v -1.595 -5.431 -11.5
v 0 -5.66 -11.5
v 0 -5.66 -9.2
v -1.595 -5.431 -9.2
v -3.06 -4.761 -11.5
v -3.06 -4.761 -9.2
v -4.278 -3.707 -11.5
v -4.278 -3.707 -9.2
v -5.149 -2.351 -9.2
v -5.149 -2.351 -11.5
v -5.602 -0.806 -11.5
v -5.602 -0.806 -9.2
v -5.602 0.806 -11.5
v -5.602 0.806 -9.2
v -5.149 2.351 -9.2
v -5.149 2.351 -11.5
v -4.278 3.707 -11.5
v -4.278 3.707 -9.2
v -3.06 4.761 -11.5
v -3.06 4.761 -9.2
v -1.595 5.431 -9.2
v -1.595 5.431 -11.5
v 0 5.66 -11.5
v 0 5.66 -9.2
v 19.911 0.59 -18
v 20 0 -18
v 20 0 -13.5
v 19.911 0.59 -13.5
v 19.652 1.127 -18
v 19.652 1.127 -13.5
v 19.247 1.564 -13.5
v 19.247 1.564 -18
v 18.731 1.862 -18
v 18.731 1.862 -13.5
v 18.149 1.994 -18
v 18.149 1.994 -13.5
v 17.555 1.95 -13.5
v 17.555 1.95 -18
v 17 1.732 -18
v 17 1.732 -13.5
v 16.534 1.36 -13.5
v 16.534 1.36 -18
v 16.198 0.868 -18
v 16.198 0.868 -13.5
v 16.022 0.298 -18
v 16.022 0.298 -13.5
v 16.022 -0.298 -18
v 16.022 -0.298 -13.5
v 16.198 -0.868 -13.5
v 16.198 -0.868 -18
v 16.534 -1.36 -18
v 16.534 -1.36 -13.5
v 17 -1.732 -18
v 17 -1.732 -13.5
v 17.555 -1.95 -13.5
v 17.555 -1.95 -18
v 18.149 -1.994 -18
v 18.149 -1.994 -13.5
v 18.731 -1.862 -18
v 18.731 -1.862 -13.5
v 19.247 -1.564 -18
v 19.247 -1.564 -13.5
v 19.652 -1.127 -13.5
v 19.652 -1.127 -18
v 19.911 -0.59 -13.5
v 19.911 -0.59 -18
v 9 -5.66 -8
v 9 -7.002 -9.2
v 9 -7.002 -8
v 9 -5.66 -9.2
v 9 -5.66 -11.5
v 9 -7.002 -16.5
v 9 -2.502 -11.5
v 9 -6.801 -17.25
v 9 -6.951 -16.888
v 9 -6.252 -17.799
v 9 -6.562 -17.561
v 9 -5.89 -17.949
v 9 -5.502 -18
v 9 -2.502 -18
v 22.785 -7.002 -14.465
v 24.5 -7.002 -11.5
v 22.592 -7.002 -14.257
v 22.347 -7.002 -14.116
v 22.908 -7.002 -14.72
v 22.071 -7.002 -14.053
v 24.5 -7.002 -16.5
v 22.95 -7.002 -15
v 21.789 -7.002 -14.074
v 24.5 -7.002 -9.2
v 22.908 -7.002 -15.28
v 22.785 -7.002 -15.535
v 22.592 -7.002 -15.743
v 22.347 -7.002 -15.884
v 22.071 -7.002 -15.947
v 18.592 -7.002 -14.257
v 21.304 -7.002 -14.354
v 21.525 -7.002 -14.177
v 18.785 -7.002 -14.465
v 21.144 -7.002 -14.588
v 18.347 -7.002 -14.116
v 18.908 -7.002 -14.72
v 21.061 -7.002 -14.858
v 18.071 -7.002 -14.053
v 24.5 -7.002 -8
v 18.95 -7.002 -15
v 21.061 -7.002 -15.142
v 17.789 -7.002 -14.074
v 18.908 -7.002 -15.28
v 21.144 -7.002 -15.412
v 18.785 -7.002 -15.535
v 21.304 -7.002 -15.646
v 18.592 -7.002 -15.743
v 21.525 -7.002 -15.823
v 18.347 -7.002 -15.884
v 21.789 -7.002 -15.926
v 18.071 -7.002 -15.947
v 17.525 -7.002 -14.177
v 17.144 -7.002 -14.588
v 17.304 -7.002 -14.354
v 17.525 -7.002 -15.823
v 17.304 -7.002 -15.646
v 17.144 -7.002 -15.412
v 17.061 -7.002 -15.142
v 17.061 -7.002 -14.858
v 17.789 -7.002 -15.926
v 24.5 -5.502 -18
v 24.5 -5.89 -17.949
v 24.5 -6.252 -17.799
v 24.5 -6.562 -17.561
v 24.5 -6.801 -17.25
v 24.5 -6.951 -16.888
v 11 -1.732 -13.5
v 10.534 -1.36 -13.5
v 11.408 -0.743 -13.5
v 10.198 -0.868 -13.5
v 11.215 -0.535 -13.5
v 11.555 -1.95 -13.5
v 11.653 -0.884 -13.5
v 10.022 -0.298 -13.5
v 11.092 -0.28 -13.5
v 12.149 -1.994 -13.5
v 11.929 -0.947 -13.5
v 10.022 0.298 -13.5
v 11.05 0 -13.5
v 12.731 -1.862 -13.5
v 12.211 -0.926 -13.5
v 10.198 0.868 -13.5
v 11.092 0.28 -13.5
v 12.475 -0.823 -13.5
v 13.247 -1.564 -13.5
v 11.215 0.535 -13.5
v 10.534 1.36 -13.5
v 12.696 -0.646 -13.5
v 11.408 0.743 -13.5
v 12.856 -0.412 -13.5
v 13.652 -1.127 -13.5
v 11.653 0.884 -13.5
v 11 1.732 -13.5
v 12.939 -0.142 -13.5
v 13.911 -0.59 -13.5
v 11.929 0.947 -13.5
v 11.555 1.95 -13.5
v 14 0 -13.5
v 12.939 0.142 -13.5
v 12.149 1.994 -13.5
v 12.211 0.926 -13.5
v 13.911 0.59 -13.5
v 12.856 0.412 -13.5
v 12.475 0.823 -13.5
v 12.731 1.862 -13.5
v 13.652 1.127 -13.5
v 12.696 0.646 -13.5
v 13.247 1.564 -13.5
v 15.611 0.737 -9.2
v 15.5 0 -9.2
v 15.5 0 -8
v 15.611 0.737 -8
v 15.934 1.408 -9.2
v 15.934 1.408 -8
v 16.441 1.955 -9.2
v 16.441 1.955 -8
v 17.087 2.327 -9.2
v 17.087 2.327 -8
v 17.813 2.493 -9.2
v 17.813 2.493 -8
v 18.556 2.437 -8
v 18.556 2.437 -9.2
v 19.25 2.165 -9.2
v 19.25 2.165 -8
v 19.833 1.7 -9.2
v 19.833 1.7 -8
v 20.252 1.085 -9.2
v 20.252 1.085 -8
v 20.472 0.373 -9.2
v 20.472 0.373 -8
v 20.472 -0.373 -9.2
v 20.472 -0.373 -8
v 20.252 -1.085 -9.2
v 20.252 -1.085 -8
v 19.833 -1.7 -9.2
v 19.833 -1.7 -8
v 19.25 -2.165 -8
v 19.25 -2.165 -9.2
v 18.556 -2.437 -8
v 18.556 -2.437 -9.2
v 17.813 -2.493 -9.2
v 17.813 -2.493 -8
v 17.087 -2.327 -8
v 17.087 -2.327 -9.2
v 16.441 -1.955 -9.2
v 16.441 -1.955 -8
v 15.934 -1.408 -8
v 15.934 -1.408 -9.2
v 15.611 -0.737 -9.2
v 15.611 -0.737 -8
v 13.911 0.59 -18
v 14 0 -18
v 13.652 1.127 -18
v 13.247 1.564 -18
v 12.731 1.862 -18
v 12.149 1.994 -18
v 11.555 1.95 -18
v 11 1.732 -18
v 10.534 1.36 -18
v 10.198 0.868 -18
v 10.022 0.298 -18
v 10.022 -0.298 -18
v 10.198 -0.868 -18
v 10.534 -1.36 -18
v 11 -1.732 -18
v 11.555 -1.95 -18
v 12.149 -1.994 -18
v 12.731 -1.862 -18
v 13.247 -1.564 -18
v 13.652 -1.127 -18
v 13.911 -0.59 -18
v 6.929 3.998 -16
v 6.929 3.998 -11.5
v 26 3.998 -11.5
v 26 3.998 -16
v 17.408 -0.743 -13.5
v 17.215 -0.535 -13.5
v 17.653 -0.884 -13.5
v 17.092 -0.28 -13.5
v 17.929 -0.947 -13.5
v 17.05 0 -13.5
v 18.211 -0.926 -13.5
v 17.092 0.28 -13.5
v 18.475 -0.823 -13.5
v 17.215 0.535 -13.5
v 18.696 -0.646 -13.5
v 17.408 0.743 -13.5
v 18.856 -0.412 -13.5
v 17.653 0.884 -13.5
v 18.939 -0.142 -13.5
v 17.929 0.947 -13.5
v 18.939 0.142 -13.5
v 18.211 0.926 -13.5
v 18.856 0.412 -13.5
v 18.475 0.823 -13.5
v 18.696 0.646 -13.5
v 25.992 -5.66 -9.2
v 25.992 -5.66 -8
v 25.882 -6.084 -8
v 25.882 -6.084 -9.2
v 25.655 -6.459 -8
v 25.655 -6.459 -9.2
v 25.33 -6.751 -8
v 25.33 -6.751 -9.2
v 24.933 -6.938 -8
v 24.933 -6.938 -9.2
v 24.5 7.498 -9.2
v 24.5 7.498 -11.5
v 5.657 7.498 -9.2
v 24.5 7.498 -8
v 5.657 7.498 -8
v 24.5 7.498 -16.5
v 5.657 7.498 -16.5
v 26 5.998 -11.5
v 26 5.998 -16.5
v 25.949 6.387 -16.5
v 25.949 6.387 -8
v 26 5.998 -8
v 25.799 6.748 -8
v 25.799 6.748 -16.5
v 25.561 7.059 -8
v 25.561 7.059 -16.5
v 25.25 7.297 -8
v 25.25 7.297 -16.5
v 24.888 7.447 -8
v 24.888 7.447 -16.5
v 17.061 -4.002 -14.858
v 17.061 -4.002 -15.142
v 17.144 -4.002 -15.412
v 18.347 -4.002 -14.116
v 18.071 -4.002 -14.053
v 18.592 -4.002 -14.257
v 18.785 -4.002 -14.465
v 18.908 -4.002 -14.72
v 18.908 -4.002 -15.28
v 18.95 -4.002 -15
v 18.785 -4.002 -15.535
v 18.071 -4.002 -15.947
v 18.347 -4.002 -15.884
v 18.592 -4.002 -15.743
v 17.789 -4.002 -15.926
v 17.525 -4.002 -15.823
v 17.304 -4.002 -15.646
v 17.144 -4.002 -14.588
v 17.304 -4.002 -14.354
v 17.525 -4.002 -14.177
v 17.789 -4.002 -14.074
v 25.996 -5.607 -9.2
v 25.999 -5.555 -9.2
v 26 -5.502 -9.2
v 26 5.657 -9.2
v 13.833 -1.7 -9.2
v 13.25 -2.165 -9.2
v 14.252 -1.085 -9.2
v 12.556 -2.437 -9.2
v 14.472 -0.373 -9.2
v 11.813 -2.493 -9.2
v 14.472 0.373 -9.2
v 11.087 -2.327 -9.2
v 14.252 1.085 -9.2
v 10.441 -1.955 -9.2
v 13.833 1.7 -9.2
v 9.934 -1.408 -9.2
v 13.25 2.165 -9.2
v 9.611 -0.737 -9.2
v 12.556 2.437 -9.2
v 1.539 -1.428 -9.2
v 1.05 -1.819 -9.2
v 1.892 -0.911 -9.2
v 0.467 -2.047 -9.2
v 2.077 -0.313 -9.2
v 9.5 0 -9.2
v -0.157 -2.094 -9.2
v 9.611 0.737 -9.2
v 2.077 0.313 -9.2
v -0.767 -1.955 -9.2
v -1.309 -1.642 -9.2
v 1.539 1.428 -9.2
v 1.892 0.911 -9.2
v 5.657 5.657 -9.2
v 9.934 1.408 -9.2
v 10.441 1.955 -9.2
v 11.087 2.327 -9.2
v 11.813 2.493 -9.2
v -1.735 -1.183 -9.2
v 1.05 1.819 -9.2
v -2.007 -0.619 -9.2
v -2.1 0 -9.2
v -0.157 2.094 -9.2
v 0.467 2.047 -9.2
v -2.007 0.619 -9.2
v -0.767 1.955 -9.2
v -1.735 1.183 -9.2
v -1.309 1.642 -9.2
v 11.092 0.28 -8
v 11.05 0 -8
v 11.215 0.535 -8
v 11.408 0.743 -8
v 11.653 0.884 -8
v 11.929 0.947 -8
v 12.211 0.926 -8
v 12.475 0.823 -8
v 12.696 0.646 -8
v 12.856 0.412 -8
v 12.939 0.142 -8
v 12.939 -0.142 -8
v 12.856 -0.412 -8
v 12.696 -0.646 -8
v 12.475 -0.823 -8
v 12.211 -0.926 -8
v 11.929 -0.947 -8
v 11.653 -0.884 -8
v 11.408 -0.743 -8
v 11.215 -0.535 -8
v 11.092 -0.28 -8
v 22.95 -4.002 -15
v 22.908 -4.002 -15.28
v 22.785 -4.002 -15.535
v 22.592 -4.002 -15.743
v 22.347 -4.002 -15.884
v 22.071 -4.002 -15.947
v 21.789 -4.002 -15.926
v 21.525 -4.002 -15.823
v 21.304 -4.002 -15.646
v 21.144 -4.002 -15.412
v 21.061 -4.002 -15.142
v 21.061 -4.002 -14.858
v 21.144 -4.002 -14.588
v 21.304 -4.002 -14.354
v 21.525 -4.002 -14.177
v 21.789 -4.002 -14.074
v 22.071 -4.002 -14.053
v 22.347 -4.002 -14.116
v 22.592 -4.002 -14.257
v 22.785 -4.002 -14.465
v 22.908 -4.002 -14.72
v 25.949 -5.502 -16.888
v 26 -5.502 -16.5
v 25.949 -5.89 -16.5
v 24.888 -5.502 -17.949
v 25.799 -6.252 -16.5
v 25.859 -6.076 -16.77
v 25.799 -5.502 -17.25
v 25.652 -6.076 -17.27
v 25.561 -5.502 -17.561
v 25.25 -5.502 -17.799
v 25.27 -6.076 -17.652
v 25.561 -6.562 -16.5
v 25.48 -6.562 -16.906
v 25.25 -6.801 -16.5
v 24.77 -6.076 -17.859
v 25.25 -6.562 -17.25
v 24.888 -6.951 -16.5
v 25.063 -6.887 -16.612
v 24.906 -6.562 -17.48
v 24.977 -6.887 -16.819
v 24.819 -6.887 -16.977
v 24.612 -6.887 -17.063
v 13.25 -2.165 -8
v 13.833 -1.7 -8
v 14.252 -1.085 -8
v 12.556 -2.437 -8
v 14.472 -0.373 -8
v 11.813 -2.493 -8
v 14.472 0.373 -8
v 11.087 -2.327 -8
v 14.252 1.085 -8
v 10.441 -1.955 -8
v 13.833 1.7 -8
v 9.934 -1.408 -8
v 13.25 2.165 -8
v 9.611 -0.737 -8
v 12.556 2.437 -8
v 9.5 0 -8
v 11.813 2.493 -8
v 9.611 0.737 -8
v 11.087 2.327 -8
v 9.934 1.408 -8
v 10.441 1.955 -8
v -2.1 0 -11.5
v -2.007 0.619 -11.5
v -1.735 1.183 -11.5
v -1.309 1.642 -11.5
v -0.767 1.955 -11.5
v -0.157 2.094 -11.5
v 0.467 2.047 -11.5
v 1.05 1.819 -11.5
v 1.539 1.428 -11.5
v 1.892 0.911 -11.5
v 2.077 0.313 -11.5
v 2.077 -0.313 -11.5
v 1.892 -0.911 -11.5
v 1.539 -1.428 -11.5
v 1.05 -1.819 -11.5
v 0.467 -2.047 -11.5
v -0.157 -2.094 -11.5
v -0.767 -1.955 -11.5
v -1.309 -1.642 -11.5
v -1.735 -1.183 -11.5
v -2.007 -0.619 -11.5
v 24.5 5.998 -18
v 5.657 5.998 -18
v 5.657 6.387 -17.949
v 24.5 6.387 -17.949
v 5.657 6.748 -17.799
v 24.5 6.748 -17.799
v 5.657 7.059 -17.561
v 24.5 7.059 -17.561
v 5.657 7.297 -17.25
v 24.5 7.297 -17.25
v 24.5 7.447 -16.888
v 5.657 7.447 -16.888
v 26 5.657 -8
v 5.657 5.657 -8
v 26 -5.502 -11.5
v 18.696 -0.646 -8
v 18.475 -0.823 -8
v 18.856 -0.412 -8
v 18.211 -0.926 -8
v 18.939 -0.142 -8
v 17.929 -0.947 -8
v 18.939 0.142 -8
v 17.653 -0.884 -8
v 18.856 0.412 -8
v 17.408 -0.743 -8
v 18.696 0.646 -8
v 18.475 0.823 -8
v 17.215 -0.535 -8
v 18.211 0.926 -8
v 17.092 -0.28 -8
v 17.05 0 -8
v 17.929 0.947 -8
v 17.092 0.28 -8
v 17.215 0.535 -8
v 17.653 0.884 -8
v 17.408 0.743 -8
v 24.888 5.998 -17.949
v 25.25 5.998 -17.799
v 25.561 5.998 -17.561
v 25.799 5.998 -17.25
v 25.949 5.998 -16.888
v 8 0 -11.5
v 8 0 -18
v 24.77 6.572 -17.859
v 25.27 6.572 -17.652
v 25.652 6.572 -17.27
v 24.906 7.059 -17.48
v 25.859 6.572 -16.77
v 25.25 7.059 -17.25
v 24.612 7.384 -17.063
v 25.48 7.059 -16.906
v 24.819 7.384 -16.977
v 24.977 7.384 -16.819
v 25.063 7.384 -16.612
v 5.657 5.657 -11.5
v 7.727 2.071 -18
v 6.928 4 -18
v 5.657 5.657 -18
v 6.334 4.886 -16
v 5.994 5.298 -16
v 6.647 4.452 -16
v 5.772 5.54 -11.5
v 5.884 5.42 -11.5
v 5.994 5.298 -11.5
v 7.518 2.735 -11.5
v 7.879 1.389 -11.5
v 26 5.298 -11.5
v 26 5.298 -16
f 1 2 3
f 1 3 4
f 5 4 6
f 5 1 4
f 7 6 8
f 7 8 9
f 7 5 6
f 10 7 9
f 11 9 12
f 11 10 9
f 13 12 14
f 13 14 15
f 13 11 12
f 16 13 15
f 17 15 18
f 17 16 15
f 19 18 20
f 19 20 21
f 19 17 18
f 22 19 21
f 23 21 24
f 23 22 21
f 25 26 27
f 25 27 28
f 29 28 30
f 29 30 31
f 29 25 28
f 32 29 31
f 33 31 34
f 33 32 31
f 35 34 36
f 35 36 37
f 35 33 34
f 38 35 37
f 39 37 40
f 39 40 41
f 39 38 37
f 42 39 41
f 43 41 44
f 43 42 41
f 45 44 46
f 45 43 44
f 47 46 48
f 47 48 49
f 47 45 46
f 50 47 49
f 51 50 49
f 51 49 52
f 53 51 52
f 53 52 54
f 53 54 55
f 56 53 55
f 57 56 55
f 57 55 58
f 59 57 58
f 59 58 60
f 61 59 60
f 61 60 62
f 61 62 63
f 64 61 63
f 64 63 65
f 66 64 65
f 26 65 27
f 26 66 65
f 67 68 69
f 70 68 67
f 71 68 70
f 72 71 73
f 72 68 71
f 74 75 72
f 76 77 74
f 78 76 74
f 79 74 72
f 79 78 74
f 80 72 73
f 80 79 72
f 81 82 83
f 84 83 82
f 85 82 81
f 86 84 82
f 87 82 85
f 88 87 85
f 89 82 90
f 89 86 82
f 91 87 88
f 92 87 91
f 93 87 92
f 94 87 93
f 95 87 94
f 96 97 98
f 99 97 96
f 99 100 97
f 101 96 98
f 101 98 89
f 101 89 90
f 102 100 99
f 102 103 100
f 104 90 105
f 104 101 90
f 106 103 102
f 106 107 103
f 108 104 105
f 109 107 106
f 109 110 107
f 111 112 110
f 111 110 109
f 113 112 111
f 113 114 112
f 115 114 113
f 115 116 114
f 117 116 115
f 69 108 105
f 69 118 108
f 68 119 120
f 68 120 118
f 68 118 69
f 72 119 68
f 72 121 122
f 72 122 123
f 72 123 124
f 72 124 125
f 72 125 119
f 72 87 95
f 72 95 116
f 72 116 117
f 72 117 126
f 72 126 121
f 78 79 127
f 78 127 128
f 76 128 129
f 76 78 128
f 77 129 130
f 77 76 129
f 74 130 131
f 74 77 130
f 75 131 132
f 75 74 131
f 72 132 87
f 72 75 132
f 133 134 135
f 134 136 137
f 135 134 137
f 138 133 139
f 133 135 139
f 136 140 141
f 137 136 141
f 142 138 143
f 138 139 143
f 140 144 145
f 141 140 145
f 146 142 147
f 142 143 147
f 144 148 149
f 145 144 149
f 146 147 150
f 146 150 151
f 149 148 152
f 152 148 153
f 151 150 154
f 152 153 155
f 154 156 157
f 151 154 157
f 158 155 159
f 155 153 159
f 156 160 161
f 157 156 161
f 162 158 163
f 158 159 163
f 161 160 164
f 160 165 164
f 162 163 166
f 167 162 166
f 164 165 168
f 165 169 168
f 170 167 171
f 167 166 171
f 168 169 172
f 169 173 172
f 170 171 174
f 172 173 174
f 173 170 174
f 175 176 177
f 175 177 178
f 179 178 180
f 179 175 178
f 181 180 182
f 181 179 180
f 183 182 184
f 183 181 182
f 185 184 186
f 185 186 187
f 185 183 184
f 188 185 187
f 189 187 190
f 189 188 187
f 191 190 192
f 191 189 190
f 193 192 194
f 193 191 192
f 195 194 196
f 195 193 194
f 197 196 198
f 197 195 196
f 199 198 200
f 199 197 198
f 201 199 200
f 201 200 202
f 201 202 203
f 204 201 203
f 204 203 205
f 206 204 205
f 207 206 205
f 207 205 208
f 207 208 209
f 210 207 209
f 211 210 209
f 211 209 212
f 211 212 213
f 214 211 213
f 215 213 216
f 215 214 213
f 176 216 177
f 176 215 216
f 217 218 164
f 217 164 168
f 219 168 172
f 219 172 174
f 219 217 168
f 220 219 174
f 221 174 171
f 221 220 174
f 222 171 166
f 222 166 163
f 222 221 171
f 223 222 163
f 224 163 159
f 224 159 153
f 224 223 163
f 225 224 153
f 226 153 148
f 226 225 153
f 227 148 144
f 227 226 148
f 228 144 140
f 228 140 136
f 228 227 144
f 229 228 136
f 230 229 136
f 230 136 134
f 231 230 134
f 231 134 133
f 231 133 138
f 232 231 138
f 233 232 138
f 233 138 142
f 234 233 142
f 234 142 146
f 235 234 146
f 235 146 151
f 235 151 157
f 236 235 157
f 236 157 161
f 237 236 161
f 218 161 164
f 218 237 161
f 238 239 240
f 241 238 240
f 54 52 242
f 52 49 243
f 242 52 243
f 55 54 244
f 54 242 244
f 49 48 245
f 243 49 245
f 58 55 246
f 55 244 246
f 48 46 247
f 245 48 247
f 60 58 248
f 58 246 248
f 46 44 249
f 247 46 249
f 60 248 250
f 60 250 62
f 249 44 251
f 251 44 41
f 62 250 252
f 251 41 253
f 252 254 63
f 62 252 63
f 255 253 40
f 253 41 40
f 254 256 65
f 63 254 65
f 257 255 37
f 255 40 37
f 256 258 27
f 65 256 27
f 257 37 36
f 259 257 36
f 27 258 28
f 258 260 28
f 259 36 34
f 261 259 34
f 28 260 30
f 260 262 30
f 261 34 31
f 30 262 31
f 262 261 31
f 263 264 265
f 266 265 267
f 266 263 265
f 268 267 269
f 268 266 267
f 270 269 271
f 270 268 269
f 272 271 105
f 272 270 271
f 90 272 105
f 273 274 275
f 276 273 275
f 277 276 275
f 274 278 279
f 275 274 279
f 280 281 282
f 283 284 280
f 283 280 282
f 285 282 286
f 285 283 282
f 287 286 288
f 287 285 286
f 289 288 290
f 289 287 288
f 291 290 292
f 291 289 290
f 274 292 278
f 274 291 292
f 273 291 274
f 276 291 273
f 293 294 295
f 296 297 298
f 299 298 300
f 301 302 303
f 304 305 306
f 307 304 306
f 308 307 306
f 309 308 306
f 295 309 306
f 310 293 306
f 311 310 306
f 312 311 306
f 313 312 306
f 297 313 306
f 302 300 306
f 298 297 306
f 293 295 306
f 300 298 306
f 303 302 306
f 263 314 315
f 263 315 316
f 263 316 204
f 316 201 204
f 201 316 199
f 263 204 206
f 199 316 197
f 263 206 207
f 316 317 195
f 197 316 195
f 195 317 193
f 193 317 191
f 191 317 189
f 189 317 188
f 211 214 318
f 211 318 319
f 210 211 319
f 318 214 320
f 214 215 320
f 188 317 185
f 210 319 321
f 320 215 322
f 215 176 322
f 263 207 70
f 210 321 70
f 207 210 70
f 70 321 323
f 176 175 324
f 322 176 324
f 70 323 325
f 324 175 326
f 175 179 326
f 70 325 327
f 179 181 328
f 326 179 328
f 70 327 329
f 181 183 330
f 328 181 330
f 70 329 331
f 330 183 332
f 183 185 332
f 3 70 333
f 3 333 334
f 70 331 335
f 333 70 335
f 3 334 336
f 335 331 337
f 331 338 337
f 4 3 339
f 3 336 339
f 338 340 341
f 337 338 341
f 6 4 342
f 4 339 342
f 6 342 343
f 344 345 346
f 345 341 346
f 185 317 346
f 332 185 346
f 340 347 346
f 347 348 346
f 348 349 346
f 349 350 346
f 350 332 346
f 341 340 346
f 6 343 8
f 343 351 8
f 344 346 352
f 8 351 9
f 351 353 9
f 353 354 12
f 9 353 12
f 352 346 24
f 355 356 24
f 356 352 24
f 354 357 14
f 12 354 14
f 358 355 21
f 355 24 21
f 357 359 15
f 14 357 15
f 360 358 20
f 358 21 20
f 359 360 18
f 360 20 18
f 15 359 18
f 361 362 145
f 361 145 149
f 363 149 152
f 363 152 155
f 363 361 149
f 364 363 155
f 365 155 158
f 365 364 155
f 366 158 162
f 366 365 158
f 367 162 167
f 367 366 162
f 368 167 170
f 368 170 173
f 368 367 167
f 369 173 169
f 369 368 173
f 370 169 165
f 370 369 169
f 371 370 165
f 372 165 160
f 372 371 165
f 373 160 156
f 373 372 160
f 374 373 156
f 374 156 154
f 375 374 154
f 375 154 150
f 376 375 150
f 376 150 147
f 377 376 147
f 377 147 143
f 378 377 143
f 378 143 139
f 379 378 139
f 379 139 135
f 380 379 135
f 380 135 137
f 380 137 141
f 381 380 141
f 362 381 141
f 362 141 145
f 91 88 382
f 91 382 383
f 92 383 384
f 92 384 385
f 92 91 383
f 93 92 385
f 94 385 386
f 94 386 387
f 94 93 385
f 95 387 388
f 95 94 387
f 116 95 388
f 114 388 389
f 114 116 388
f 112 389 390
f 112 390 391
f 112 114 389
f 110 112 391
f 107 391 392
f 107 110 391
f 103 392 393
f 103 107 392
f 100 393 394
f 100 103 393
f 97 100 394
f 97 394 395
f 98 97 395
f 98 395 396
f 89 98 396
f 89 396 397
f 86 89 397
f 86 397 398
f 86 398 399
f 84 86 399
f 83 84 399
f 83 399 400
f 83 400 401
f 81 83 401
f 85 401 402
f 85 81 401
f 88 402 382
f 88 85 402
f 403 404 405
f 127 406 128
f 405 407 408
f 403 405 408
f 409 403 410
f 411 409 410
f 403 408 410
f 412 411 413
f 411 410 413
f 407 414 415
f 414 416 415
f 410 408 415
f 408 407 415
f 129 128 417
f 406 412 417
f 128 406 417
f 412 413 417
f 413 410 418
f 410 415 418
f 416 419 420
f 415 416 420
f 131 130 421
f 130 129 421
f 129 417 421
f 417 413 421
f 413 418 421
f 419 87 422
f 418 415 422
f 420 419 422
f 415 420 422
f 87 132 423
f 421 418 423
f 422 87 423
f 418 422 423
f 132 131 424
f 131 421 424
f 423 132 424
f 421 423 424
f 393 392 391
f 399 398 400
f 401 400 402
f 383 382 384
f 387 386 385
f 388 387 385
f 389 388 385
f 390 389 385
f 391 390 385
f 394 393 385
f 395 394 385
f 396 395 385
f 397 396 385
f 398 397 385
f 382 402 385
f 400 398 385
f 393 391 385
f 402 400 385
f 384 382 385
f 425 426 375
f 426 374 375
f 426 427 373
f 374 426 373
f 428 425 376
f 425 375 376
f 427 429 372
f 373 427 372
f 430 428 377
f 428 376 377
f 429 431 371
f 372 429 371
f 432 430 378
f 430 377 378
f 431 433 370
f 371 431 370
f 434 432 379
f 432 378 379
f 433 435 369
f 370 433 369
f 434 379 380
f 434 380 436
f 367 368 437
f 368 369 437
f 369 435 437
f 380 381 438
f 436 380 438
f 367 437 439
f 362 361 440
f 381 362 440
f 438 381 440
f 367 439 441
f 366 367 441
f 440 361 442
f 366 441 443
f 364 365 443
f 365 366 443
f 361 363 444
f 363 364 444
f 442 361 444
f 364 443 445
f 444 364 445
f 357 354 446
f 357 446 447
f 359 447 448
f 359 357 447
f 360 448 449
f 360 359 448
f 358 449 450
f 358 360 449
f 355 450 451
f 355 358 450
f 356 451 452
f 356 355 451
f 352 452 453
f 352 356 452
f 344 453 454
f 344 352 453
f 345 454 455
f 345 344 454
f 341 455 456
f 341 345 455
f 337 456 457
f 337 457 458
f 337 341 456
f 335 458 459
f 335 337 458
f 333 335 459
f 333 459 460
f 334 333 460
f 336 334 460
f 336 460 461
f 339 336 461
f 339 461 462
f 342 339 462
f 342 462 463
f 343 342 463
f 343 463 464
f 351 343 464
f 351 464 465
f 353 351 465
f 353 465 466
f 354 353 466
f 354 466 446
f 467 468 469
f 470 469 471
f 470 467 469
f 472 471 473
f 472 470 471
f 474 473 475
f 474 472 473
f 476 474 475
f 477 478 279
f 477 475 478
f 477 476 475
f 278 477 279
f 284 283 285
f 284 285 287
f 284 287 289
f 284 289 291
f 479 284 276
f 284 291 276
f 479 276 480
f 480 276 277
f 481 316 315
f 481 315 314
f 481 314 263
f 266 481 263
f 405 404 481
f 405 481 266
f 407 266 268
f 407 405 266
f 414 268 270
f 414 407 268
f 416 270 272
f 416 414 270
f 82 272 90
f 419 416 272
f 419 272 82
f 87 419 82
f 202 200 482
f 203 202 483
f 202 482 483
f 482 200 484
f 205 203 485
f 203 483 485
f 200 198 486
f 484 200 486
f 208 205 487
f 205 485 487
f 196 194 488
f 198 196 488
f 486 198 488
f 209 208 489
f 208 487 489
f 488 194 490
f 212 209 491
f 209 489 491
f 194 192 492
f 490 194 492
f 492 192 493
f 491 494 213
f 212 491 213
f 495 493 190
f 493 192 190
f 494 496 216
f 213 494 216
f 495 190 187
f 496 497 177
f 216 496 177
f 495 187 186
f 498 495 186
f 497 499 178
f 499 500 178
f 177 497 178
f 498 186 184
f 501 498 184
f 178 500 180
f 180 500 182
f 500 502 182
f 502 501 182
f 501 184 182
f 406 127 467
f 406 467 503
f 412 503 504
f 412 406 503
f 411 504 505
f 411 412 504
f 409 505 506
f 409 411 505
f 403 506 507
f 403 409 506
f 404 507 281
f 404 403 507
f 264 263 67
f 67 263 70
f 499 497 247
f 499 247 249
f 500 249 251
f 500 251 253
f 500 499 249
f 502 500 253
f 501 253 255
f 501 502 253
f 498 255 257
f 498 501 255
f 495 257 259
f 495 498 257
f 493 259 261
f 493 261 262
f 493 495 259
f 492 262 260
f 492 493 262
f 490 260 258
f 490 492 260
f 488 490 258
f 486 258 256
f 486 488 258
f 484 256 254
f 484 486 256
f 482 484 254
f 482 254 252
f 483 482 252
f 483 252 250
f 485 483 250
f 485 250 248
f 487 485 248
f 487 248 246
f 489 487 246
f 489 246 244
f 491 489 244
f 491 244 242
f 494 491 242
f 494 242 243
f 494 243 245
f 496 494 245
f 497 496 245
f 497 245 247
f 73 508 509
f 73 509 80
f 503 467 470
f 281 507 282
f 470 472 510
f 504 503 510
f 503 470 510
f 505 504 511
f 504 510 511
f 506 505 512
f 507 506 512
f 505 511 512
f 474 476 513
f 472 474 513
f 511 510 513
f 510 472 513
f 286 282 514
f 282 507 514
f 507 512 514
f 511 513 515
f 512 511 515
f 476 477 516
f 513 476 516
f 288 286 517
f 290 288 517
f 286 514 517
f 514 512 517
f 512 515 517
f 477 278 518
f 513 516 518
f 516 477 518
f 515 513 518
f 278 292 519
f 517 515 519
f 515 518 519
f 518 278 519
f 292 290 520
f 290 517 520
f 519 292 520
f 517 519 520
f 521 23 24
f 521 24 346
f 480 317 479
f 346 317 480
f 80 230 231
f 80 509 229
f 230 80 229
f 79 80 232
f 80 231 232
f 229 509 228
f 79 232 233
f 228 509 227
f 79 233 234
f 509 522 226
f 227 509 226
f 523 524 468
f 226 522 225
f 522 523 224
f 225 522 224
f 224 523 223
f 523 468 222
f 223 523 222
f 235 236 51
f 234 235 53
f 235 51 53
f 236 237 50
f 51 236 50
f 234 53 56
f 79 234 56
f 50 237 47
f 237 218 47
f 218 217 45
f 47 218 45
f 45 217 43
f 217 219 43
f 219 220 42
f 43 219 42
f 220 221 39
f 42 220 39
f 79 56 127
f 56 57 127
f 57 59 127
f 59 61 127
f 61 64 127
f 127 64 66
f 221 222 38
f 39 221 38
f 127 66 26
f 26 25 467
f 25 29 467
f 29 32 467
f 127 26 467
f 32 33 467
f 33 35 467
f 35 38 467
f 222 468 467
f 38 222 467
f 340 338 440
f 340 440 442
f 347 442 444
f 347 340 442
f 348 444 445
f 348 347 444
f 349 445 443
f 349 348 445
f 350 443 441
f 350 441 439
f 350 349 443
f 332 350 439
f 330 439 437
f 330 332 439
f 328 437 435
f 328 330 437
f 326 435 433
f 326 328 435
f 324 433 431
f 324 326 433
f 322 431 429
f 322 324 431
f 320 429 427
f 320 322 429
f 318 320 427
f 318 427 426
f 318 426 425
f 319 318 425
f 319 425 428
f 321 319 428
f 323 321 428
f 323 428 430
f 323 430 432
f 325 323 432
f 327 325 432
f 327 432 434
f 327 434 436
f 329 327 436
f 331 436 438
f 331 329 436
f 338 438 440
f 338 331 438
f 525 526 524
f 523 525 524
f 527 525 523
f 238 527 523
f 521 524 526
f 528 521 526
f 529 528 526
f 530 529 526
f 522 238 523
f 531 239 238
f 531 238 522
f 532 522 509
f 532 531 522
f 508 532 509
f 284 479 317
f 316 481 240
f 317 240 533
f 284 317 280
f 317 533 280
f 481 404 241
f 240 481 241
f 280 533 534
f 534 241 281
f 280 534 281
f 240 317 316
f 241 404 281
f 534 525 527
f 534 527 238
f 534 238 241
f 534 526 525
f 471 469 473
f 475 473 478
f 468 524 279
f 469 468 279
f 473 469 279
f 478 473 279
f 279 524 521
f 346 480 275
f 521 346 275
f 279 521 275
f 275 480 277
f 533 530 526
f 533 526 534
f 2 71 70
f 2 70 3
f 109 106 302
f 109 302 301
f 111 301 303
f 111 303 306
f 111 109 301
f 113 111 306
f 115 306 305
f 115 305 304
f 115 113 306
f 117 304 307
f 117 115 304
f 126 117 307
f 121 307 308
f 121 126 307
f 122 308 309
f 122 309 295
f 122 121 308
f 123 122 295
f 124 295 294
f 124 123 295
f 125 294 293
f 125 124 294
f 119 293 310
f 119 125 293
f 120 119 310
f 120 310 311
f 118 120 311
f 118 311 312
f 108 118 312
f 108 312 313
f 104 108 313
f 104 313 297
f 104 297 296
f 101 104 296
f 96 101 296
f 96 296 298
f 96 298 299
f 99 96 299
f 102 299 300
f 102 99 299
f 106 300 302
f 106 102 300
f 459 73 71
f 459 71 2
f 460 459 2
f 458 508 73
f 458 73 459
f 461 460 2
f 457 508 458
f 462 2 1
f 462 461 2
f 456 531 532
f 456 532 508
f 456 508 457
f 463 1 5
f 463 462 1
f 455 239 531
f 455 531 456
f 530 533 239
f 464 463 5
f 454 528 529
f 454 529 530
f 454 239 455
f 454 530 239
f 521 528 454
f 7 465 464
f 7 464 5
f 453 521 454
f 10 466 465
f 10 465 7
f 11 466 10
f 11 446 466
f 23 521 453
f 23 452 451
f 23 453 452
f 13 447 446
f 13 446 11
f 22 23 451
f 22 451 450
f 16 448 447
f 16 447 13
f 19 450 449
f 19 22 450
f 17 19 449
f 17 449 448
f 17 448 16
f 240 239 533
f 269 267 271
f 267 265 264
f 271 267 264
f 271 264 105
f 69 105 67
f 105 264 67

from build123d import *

# Parameters (mm, degrees)
BOSS_EXTRUDE1_DEPTH = 2
BOSS_EXTRUDE2_START = 4.5
BOSS_EXTRUDE2_DEPTH = 4.5
CUT_EXTRUDE1_DEPTH  = 4.5
BOSS_EXTRUDE3_DEPTH = 2.3
SKETCH9_R           = 2.1
CUT_EXTRUDE2_DEPTH  = 2.5
SKETCH10_R          = 2.5
BOSS_EXTRUDE4_DEPTH = 1.2
SKETCH11_R          = 0.95
CUT_EXTRUDE3_DEPTH  = 9.2
SKETCH12_R          = 2
CUT_EXTRUDE4_DEPTH  = 4.5
SKETCH14_W          = 20.343145751
SKETCH14_H          = 1.841510486
SKETCH14_W_2        = 17
SKETCH14_H_2        = 1.341637015
BOSS_EXTRUDE5_DEPTH = 1.2
FILLET1_R           = 1.5
SKETCH17_R          = 0.95
CUT_EXTRUDE5_DEPTH  = 3


# Read off the part's stored shape, not the designer's step: Boss-Extrude3
with BuildPart() as part:
    # Sketch5 → Boss-Extrude1 (new body)
    with BuildSketch(Plane.XY):
        with BuildLine():
            Line((8, 0), (9, -2.501635265))
            Line((9, -2.501635265), (9, -7.001635265))
            Line((9, -7.001635265), (26, -7.001635265))
            Line((26, -7.001635265), (26, 7.498364735))
            Line((26, 7.498364735), (5.656854249, 7.498364735))
            Line((5.656854249, 7.498364735), (5.656854249, 5.656854249))
            ThreePointArc((5.656854249, 5.656854249), (7.39103626, 3.061467459), (8, 0))
        make_face()
    extrude(amount=BOSS_EXTRUDE1_DEPTH)

    # Sketch6 → Boss-Extrude2 (add)
    with BuildSketch(Plane(origin=(0, 0, 0), x_dir=(-1, 0, 0), z_dir=(0, 0, -1)).offset(BOSS_EXTRUDE2_START)):
        with BuildLine():
            Line((-5.656854249, 7.498364735), (-5.656854249, 5.656854249))
            ThreePointArc((-5.656854249, 5.656854249), (-7.39103626, 3.061467459), (-8, 0))
            Line((-8, 0), (-9, -2.501635265))
            Line((-9, -2.501635265), (-9, -7.001635265))
            Line((-9, -7.001635265), (-26, -7.001635265))
            Line((-26, -7.001635265), (-26, 7.498364735))
            Line((-26, 7.498364735), (-5.656854249, 7.498364735))
        make_face()
    extrude(amount=-BOSS_EXTRUDE2_DEPTH)

    # Sketch7 → Cut-Extrude1 (cut)
    with BuildSketch(Plane(origin=(0, 0, -4.5), x_dir=(-1, 0, 0), z_dir=(0, 0, -1))):
        Polygon((-26, 5.298364735), (-2.738141148, 5.298364735), (-2.738141148, 3.998364735), (-29.849535112, 3.998364735), (-29.849535112, 5.298364735), align=None)
    extrude(amount=-CUT_EXTRUDE1_DEPTH, mode=Mode.SUBTRACT)

    # Boss-Extrude3 outline → Boss-Extrude3 (add)
    with BuildSketch(Plane(origin=(0, 0, -4.5), x_dir=(-1, 0, 0), z_dir=(0, 0, -1))):
        with BuildLine():
            Line((-9, -7.001635265), (-9, -5.65999825))
            Line((-9, -5.65999825), (0, -5.659997813))
            ThreePointArc((0, -5.659997813), (5.659997813, 0), (0, 5.659997813))
            Line((0, 5.659997813), (-5.656854249, 5.656854249))
            Line((-5.656854249, 5.656854249), (-5.656854249, 7.498364735))
            Line((-5.656854249, 7.498364735), (-26, 7.498364735))
            Line((-26, 7.498364735), (-26, -7.001635265))
            Line((-26, -7.001635265), (-9, -7.001635265))
        make_face()
    extrude(amount=BOSS_EXTRUDE3_DEPTH)

    # Sketch9 → Cut-Extrude2 (cut)
    with BuildSketch(Plane(origin=(0, 0, -6.8), x_dir=(-1, 0, 0), z_dir=(0, 0, -1))):
        Circle(SKETCH9_R)
    extrude(amount=-CUT_EXTRUDE2_DEPTH, mode=Mode.SUBTRACT)

    # Sketch10 → Boss-Extrude4 (add)
    with BuildSketch(Plane(origin=(0, 0, -6.8), x_dir=(-1, 0, 0), z_dir=(0, 0, -1))):
        with Locations((-12, 0)):
            Circle(SKETCH10_R)
        with Locations((-18, 0)):
            Circle(SKETCH10_R)
    extrude(amount=BOSS_EXTRUDE4_DEPTH)

    # Sketch11 → Cut-Extrude3 (cut)
    with BuildSketch(Plane(origin=(0, 0, -8), x_dir=(-1, 0, 0), z_dir=(0, 0, -1))):
        with Locations((-18, 0)):
            Circle(SKETCH11_R)
        with Locations((-12, 0)):
            Circle(SKETCH11_R)
    extrude(amount=-CUT_EXTRUDE3_DEPTH, mode=Mode.SUBTRACT)

    # Sketch12 → Cut-Extrude4 (cut)
    with BuildSketch(Plane.XY.offset(2)):
        with Locations((12, 0)):
            Circle(SKETCH12_R)
        with Locations((18, 0)):
            Circle(SKETCH12_R)
    extrude(amount=-CUT_EXTRUDE4_DEPTH, mode=Mode.SUBTRACT)

    # Sketch14 → Boss-Extrude5 (add)
    with BuildSketch(Plane(origin=(0, 0, -6.8), x_dir=(-1, 0, 0), z_dir=(0, 0, -1))):
        with Locations((-15.828427124, 6.577609492)):
            Rectangle(SKETCH14_W, SKETCH14_H)
        with Locations((-17.5, -6.330816758)):
            Rectangle(SKETCH14_W_2, SKETCH14_H_2)
    extrude(amount=BOSS_EXTRUDE5_DEPTH)

    # Fillet1
    # the kernel refuses this fillet: 1.5 mm, written as the material it takes off along each edge
    with BuildSketch(Plane(origin=(24.5, -5.501635265, 0.5), x_dir=(0, 0, 1), z_dir=(0, -1, 0))) as fillet1_piece_1_section:
        Polygon((0, 0), (FILLET1_R, 0), (FILLET1_R, -FILLET1_R), (0, -FILLET1_R), align=None)
    fillet1_piece_1 = extrude(amount=FILLET1_R, mode=Mode.PRIVATE)
    fillet1_piece_1 = fillet1_piece_1 - Plane(origin=(24.5, -5.501635265, 0.5), x_dir=(-0.7071067811865475, 0, -0.7071067811865475), z_dir=(0, -1, 0)) * Sphere(FILLET1_R, mode=Mode.PRIVATE)
    add(fillet1_piece_1, mode=Mode.SUBTRACT)
    with BuildSketch(Plane(origin=(24.5, 5.998364735, 0.5), x_dir=(0, 0, 1), z_dir=(0, 1, 0))) as fillet1_piece_2_section:
        Polygon((0, 0), (FILLET1_R, 0), (FILLET1_R, FILLET1_R), (0, FILLET1_R), align=None)
    fillet1_piece_2 = extrude(amount=FILLET1_R, mode=Mode.PRIVATE)
    fillet1_piece_2 = fillet1_piece_2 - Plane(origin=(24.5, 5.998364735, 0.5), x_dir=(-0.7071067811865475, 0, -0.7071067811865475), z_dir=(0, 1, 0)) * Sphere(FILLET1_R, mode=Mode.PRIVATE)
    add(fillet1_piece_2, mode=Mode.SUBTRACT)
    with BuildSketch(Plane(origin=(26, -5.501635265, 2), x_dir=(-1, 0, 0), z_dir=(0, 1, 0))) as fillet1_piece_3:
        with BuildLine():
            CenterArc((FILLET1_R, -FILLET1_R), FILLET1_R, 90, 90)
            Line((0, -FILLET1_R), (0, 0))
            Line((0, 0), (FILLET1_R, 0))
        make_face()
    extrude(amount=11.5, mode=Mode.SUBTRACT)
    with BuildSketch(Plane(origin=(26, -7.001635265, -4.5), x_dir=(-1, 0, 0), z_dir=(0, 0, 1))) as fillet1_piece_4:
        with BuildLine():
            CenterArc((FILLET1_R, -FILLET1_R), FILLET1_R, 90, 90)
            Line((0, -FILLET1_R), (0, 0))
            Line((0, 0), (FILLET1_R, 0))
        make_face()
    extrude(amount=5, mode=Mode.SUBTRACT)
    with BuildSketch(Plane(origin=(5.25, -7.001635265, 2), x_dir=(0, 1, 0), z_dir=(1, 0, 0))) as fillet1_piece_5:
        with BuildLine():
            CenterArc((FILLET1_R, -FILLET1_R), FILLET1_R, 90, 90)
            Line((0, -FILLET1_R), (0, 0))
            Line((0, 0), (FILLET1_R, 0))
        make_face()
    extrude(amount=19.25, mode=Mode.SUBTRACT)
    with BuildSketch(Plane(origin=(24.5, 7.498364735, 2), x_dir=(0, -1, 0), z_dir=(-1, 0, 0))) as fillet1_piece_6:
        with BuildLine():
            CenterArc((FILLET1_R, -FILLET1_R), FILLET1_R, 90, 90)
            Line((0, -FILLET1_R), (0, 0))
            Line((0, 0), (FILLET1_R, 0))
        make_face()
    extrude(amount=22.593145751, mode=Mode.SUBTRACT)
    with BuildSketch(Plane(origin=(26, 7.498364735, -4.5), x_dir=(-1, 0, 0), z_dir=(0, 0, 1))) as fillet1_piece_7:
        with BuildLine():
            CenterArc((FILLET1_R, FILLET1_R), FILLET1_R, 180, 90)
            Line((0, FILLET1_R), (0, 0))
            Line((0, 0), (FILLET1_R, 0))
        make_face()
    extrude(amount=5, mode=Mode.SUBTRACT)
    with BuildSketch(Plane(origin=(26, 7.498364735, -4.5), x_dir=(-1.0, -1.9174232572065026e-10, 0), z_dir=(0, 0, -1))) as fillet1_piece_8:
        with BuildLine():
            CenterArc((FILLET1_R, -FILLET1_R), FILLET1_R, 90.000000011, 90)
            Line((FILLET1_R * 1.9173522033e-10, -FILLET1_R), (0, 0))
            Line((0, 0), (FILLET1_R, 0))
        make_face()
    extrude(amount=2.3, mode=Mode.SUBTRACT)
    with BuildSketch(Plane(origin=(26, 7.498364735, -6.8), x_dir=(-1, 0, 0), z_dir=(0, 0, -1))) as fillet1_piece_9:
        with BuildLine():
            CenterArc((FILLET1_R, -FILLET1_R), FILLET1_R, 90, 90)
            Line((0, -FILLET1_R), (0, 0))
            Line((0, 0), (FILLET1_R, 0))
        make_face()
    extrude(amount=4.95, mode=Mode.SUBTRACT)
    with BuildSketch(Plane(origin=(26, -7.001635265, -4.5), x_dir=(-1.0, -1.9169850891861218e-10, 0), z_dir=(0, 0, -1))) as fillet1_piece_10:
        with BuildLine():
            CenterArc((FILLET1_R, FILLET1_R), FILLET1_R, 180.000000011, 90)
            Line((-FILLET1_R * 1.91707982785e-10, FILLET1_R), (0, 0))
            Line((0, 0), (FILLET1_R, 0))
        make_face()
    extrude(amount=2.3, mode=Mode.SUBTRACT)
    with BuildSketch(Plane(origin=(26, -7.001635265, -6.8), x_dir=(-1, 0, 0), z_dir=(0, 0, -1))) as fillet1_piece_11:
        with BuildLine():
            CenterArc((FILLET1_R, FILLET1_R), FILLET1_R, 180, 90)
            Line((0, FILLET1_R), (0, 0))
            Line((0, 0), (FILLET1_R, 0))
        make_face()
    extrude(amount=4.95, mode=Mode.SUBTRACT)

    # Sketch17 → Cut-Extrude5 (cut)
    with BuildSketch(Plane.XZ.offset(7.001635265)):
        with Locations((22, -1)):
            Circle(SKETCH17_R)
        with Locations((18, -1)):
            Circle(SKETCH17_R)
    extrude(amount=-CUT_EXTRUDE5_DEPTH, mode=Mode.SUBTRACT)

    # Mirror1: part across plane


with BuildPart() as part_1:
    add(part.part)
    add(part.part.mirror(Plane(origin=(0, 0, -8), x_dir=(1, 0, 0), z_dir=(0, 0, -1))))


with BuildPart() as body_2:
    # Split1: the piece on the far side of the plane
    add(part_1.part)
    split(bisect_by=Plane(origin=(0, 0, -8), x_dir=(-1, 0, 0), z_dir=(0, 0, -1)), keep=Keep.BOTTOM)


with BuildPart() as part_2:
    add(part_1.part)

    # Split1
    split(bisect_by=Plane(origin=(0, 0, -8), x_dir=(-1, 0, 0), z_dir=(0, 0, -1)), keep=Keep.TOP)


solid = part_2.part
